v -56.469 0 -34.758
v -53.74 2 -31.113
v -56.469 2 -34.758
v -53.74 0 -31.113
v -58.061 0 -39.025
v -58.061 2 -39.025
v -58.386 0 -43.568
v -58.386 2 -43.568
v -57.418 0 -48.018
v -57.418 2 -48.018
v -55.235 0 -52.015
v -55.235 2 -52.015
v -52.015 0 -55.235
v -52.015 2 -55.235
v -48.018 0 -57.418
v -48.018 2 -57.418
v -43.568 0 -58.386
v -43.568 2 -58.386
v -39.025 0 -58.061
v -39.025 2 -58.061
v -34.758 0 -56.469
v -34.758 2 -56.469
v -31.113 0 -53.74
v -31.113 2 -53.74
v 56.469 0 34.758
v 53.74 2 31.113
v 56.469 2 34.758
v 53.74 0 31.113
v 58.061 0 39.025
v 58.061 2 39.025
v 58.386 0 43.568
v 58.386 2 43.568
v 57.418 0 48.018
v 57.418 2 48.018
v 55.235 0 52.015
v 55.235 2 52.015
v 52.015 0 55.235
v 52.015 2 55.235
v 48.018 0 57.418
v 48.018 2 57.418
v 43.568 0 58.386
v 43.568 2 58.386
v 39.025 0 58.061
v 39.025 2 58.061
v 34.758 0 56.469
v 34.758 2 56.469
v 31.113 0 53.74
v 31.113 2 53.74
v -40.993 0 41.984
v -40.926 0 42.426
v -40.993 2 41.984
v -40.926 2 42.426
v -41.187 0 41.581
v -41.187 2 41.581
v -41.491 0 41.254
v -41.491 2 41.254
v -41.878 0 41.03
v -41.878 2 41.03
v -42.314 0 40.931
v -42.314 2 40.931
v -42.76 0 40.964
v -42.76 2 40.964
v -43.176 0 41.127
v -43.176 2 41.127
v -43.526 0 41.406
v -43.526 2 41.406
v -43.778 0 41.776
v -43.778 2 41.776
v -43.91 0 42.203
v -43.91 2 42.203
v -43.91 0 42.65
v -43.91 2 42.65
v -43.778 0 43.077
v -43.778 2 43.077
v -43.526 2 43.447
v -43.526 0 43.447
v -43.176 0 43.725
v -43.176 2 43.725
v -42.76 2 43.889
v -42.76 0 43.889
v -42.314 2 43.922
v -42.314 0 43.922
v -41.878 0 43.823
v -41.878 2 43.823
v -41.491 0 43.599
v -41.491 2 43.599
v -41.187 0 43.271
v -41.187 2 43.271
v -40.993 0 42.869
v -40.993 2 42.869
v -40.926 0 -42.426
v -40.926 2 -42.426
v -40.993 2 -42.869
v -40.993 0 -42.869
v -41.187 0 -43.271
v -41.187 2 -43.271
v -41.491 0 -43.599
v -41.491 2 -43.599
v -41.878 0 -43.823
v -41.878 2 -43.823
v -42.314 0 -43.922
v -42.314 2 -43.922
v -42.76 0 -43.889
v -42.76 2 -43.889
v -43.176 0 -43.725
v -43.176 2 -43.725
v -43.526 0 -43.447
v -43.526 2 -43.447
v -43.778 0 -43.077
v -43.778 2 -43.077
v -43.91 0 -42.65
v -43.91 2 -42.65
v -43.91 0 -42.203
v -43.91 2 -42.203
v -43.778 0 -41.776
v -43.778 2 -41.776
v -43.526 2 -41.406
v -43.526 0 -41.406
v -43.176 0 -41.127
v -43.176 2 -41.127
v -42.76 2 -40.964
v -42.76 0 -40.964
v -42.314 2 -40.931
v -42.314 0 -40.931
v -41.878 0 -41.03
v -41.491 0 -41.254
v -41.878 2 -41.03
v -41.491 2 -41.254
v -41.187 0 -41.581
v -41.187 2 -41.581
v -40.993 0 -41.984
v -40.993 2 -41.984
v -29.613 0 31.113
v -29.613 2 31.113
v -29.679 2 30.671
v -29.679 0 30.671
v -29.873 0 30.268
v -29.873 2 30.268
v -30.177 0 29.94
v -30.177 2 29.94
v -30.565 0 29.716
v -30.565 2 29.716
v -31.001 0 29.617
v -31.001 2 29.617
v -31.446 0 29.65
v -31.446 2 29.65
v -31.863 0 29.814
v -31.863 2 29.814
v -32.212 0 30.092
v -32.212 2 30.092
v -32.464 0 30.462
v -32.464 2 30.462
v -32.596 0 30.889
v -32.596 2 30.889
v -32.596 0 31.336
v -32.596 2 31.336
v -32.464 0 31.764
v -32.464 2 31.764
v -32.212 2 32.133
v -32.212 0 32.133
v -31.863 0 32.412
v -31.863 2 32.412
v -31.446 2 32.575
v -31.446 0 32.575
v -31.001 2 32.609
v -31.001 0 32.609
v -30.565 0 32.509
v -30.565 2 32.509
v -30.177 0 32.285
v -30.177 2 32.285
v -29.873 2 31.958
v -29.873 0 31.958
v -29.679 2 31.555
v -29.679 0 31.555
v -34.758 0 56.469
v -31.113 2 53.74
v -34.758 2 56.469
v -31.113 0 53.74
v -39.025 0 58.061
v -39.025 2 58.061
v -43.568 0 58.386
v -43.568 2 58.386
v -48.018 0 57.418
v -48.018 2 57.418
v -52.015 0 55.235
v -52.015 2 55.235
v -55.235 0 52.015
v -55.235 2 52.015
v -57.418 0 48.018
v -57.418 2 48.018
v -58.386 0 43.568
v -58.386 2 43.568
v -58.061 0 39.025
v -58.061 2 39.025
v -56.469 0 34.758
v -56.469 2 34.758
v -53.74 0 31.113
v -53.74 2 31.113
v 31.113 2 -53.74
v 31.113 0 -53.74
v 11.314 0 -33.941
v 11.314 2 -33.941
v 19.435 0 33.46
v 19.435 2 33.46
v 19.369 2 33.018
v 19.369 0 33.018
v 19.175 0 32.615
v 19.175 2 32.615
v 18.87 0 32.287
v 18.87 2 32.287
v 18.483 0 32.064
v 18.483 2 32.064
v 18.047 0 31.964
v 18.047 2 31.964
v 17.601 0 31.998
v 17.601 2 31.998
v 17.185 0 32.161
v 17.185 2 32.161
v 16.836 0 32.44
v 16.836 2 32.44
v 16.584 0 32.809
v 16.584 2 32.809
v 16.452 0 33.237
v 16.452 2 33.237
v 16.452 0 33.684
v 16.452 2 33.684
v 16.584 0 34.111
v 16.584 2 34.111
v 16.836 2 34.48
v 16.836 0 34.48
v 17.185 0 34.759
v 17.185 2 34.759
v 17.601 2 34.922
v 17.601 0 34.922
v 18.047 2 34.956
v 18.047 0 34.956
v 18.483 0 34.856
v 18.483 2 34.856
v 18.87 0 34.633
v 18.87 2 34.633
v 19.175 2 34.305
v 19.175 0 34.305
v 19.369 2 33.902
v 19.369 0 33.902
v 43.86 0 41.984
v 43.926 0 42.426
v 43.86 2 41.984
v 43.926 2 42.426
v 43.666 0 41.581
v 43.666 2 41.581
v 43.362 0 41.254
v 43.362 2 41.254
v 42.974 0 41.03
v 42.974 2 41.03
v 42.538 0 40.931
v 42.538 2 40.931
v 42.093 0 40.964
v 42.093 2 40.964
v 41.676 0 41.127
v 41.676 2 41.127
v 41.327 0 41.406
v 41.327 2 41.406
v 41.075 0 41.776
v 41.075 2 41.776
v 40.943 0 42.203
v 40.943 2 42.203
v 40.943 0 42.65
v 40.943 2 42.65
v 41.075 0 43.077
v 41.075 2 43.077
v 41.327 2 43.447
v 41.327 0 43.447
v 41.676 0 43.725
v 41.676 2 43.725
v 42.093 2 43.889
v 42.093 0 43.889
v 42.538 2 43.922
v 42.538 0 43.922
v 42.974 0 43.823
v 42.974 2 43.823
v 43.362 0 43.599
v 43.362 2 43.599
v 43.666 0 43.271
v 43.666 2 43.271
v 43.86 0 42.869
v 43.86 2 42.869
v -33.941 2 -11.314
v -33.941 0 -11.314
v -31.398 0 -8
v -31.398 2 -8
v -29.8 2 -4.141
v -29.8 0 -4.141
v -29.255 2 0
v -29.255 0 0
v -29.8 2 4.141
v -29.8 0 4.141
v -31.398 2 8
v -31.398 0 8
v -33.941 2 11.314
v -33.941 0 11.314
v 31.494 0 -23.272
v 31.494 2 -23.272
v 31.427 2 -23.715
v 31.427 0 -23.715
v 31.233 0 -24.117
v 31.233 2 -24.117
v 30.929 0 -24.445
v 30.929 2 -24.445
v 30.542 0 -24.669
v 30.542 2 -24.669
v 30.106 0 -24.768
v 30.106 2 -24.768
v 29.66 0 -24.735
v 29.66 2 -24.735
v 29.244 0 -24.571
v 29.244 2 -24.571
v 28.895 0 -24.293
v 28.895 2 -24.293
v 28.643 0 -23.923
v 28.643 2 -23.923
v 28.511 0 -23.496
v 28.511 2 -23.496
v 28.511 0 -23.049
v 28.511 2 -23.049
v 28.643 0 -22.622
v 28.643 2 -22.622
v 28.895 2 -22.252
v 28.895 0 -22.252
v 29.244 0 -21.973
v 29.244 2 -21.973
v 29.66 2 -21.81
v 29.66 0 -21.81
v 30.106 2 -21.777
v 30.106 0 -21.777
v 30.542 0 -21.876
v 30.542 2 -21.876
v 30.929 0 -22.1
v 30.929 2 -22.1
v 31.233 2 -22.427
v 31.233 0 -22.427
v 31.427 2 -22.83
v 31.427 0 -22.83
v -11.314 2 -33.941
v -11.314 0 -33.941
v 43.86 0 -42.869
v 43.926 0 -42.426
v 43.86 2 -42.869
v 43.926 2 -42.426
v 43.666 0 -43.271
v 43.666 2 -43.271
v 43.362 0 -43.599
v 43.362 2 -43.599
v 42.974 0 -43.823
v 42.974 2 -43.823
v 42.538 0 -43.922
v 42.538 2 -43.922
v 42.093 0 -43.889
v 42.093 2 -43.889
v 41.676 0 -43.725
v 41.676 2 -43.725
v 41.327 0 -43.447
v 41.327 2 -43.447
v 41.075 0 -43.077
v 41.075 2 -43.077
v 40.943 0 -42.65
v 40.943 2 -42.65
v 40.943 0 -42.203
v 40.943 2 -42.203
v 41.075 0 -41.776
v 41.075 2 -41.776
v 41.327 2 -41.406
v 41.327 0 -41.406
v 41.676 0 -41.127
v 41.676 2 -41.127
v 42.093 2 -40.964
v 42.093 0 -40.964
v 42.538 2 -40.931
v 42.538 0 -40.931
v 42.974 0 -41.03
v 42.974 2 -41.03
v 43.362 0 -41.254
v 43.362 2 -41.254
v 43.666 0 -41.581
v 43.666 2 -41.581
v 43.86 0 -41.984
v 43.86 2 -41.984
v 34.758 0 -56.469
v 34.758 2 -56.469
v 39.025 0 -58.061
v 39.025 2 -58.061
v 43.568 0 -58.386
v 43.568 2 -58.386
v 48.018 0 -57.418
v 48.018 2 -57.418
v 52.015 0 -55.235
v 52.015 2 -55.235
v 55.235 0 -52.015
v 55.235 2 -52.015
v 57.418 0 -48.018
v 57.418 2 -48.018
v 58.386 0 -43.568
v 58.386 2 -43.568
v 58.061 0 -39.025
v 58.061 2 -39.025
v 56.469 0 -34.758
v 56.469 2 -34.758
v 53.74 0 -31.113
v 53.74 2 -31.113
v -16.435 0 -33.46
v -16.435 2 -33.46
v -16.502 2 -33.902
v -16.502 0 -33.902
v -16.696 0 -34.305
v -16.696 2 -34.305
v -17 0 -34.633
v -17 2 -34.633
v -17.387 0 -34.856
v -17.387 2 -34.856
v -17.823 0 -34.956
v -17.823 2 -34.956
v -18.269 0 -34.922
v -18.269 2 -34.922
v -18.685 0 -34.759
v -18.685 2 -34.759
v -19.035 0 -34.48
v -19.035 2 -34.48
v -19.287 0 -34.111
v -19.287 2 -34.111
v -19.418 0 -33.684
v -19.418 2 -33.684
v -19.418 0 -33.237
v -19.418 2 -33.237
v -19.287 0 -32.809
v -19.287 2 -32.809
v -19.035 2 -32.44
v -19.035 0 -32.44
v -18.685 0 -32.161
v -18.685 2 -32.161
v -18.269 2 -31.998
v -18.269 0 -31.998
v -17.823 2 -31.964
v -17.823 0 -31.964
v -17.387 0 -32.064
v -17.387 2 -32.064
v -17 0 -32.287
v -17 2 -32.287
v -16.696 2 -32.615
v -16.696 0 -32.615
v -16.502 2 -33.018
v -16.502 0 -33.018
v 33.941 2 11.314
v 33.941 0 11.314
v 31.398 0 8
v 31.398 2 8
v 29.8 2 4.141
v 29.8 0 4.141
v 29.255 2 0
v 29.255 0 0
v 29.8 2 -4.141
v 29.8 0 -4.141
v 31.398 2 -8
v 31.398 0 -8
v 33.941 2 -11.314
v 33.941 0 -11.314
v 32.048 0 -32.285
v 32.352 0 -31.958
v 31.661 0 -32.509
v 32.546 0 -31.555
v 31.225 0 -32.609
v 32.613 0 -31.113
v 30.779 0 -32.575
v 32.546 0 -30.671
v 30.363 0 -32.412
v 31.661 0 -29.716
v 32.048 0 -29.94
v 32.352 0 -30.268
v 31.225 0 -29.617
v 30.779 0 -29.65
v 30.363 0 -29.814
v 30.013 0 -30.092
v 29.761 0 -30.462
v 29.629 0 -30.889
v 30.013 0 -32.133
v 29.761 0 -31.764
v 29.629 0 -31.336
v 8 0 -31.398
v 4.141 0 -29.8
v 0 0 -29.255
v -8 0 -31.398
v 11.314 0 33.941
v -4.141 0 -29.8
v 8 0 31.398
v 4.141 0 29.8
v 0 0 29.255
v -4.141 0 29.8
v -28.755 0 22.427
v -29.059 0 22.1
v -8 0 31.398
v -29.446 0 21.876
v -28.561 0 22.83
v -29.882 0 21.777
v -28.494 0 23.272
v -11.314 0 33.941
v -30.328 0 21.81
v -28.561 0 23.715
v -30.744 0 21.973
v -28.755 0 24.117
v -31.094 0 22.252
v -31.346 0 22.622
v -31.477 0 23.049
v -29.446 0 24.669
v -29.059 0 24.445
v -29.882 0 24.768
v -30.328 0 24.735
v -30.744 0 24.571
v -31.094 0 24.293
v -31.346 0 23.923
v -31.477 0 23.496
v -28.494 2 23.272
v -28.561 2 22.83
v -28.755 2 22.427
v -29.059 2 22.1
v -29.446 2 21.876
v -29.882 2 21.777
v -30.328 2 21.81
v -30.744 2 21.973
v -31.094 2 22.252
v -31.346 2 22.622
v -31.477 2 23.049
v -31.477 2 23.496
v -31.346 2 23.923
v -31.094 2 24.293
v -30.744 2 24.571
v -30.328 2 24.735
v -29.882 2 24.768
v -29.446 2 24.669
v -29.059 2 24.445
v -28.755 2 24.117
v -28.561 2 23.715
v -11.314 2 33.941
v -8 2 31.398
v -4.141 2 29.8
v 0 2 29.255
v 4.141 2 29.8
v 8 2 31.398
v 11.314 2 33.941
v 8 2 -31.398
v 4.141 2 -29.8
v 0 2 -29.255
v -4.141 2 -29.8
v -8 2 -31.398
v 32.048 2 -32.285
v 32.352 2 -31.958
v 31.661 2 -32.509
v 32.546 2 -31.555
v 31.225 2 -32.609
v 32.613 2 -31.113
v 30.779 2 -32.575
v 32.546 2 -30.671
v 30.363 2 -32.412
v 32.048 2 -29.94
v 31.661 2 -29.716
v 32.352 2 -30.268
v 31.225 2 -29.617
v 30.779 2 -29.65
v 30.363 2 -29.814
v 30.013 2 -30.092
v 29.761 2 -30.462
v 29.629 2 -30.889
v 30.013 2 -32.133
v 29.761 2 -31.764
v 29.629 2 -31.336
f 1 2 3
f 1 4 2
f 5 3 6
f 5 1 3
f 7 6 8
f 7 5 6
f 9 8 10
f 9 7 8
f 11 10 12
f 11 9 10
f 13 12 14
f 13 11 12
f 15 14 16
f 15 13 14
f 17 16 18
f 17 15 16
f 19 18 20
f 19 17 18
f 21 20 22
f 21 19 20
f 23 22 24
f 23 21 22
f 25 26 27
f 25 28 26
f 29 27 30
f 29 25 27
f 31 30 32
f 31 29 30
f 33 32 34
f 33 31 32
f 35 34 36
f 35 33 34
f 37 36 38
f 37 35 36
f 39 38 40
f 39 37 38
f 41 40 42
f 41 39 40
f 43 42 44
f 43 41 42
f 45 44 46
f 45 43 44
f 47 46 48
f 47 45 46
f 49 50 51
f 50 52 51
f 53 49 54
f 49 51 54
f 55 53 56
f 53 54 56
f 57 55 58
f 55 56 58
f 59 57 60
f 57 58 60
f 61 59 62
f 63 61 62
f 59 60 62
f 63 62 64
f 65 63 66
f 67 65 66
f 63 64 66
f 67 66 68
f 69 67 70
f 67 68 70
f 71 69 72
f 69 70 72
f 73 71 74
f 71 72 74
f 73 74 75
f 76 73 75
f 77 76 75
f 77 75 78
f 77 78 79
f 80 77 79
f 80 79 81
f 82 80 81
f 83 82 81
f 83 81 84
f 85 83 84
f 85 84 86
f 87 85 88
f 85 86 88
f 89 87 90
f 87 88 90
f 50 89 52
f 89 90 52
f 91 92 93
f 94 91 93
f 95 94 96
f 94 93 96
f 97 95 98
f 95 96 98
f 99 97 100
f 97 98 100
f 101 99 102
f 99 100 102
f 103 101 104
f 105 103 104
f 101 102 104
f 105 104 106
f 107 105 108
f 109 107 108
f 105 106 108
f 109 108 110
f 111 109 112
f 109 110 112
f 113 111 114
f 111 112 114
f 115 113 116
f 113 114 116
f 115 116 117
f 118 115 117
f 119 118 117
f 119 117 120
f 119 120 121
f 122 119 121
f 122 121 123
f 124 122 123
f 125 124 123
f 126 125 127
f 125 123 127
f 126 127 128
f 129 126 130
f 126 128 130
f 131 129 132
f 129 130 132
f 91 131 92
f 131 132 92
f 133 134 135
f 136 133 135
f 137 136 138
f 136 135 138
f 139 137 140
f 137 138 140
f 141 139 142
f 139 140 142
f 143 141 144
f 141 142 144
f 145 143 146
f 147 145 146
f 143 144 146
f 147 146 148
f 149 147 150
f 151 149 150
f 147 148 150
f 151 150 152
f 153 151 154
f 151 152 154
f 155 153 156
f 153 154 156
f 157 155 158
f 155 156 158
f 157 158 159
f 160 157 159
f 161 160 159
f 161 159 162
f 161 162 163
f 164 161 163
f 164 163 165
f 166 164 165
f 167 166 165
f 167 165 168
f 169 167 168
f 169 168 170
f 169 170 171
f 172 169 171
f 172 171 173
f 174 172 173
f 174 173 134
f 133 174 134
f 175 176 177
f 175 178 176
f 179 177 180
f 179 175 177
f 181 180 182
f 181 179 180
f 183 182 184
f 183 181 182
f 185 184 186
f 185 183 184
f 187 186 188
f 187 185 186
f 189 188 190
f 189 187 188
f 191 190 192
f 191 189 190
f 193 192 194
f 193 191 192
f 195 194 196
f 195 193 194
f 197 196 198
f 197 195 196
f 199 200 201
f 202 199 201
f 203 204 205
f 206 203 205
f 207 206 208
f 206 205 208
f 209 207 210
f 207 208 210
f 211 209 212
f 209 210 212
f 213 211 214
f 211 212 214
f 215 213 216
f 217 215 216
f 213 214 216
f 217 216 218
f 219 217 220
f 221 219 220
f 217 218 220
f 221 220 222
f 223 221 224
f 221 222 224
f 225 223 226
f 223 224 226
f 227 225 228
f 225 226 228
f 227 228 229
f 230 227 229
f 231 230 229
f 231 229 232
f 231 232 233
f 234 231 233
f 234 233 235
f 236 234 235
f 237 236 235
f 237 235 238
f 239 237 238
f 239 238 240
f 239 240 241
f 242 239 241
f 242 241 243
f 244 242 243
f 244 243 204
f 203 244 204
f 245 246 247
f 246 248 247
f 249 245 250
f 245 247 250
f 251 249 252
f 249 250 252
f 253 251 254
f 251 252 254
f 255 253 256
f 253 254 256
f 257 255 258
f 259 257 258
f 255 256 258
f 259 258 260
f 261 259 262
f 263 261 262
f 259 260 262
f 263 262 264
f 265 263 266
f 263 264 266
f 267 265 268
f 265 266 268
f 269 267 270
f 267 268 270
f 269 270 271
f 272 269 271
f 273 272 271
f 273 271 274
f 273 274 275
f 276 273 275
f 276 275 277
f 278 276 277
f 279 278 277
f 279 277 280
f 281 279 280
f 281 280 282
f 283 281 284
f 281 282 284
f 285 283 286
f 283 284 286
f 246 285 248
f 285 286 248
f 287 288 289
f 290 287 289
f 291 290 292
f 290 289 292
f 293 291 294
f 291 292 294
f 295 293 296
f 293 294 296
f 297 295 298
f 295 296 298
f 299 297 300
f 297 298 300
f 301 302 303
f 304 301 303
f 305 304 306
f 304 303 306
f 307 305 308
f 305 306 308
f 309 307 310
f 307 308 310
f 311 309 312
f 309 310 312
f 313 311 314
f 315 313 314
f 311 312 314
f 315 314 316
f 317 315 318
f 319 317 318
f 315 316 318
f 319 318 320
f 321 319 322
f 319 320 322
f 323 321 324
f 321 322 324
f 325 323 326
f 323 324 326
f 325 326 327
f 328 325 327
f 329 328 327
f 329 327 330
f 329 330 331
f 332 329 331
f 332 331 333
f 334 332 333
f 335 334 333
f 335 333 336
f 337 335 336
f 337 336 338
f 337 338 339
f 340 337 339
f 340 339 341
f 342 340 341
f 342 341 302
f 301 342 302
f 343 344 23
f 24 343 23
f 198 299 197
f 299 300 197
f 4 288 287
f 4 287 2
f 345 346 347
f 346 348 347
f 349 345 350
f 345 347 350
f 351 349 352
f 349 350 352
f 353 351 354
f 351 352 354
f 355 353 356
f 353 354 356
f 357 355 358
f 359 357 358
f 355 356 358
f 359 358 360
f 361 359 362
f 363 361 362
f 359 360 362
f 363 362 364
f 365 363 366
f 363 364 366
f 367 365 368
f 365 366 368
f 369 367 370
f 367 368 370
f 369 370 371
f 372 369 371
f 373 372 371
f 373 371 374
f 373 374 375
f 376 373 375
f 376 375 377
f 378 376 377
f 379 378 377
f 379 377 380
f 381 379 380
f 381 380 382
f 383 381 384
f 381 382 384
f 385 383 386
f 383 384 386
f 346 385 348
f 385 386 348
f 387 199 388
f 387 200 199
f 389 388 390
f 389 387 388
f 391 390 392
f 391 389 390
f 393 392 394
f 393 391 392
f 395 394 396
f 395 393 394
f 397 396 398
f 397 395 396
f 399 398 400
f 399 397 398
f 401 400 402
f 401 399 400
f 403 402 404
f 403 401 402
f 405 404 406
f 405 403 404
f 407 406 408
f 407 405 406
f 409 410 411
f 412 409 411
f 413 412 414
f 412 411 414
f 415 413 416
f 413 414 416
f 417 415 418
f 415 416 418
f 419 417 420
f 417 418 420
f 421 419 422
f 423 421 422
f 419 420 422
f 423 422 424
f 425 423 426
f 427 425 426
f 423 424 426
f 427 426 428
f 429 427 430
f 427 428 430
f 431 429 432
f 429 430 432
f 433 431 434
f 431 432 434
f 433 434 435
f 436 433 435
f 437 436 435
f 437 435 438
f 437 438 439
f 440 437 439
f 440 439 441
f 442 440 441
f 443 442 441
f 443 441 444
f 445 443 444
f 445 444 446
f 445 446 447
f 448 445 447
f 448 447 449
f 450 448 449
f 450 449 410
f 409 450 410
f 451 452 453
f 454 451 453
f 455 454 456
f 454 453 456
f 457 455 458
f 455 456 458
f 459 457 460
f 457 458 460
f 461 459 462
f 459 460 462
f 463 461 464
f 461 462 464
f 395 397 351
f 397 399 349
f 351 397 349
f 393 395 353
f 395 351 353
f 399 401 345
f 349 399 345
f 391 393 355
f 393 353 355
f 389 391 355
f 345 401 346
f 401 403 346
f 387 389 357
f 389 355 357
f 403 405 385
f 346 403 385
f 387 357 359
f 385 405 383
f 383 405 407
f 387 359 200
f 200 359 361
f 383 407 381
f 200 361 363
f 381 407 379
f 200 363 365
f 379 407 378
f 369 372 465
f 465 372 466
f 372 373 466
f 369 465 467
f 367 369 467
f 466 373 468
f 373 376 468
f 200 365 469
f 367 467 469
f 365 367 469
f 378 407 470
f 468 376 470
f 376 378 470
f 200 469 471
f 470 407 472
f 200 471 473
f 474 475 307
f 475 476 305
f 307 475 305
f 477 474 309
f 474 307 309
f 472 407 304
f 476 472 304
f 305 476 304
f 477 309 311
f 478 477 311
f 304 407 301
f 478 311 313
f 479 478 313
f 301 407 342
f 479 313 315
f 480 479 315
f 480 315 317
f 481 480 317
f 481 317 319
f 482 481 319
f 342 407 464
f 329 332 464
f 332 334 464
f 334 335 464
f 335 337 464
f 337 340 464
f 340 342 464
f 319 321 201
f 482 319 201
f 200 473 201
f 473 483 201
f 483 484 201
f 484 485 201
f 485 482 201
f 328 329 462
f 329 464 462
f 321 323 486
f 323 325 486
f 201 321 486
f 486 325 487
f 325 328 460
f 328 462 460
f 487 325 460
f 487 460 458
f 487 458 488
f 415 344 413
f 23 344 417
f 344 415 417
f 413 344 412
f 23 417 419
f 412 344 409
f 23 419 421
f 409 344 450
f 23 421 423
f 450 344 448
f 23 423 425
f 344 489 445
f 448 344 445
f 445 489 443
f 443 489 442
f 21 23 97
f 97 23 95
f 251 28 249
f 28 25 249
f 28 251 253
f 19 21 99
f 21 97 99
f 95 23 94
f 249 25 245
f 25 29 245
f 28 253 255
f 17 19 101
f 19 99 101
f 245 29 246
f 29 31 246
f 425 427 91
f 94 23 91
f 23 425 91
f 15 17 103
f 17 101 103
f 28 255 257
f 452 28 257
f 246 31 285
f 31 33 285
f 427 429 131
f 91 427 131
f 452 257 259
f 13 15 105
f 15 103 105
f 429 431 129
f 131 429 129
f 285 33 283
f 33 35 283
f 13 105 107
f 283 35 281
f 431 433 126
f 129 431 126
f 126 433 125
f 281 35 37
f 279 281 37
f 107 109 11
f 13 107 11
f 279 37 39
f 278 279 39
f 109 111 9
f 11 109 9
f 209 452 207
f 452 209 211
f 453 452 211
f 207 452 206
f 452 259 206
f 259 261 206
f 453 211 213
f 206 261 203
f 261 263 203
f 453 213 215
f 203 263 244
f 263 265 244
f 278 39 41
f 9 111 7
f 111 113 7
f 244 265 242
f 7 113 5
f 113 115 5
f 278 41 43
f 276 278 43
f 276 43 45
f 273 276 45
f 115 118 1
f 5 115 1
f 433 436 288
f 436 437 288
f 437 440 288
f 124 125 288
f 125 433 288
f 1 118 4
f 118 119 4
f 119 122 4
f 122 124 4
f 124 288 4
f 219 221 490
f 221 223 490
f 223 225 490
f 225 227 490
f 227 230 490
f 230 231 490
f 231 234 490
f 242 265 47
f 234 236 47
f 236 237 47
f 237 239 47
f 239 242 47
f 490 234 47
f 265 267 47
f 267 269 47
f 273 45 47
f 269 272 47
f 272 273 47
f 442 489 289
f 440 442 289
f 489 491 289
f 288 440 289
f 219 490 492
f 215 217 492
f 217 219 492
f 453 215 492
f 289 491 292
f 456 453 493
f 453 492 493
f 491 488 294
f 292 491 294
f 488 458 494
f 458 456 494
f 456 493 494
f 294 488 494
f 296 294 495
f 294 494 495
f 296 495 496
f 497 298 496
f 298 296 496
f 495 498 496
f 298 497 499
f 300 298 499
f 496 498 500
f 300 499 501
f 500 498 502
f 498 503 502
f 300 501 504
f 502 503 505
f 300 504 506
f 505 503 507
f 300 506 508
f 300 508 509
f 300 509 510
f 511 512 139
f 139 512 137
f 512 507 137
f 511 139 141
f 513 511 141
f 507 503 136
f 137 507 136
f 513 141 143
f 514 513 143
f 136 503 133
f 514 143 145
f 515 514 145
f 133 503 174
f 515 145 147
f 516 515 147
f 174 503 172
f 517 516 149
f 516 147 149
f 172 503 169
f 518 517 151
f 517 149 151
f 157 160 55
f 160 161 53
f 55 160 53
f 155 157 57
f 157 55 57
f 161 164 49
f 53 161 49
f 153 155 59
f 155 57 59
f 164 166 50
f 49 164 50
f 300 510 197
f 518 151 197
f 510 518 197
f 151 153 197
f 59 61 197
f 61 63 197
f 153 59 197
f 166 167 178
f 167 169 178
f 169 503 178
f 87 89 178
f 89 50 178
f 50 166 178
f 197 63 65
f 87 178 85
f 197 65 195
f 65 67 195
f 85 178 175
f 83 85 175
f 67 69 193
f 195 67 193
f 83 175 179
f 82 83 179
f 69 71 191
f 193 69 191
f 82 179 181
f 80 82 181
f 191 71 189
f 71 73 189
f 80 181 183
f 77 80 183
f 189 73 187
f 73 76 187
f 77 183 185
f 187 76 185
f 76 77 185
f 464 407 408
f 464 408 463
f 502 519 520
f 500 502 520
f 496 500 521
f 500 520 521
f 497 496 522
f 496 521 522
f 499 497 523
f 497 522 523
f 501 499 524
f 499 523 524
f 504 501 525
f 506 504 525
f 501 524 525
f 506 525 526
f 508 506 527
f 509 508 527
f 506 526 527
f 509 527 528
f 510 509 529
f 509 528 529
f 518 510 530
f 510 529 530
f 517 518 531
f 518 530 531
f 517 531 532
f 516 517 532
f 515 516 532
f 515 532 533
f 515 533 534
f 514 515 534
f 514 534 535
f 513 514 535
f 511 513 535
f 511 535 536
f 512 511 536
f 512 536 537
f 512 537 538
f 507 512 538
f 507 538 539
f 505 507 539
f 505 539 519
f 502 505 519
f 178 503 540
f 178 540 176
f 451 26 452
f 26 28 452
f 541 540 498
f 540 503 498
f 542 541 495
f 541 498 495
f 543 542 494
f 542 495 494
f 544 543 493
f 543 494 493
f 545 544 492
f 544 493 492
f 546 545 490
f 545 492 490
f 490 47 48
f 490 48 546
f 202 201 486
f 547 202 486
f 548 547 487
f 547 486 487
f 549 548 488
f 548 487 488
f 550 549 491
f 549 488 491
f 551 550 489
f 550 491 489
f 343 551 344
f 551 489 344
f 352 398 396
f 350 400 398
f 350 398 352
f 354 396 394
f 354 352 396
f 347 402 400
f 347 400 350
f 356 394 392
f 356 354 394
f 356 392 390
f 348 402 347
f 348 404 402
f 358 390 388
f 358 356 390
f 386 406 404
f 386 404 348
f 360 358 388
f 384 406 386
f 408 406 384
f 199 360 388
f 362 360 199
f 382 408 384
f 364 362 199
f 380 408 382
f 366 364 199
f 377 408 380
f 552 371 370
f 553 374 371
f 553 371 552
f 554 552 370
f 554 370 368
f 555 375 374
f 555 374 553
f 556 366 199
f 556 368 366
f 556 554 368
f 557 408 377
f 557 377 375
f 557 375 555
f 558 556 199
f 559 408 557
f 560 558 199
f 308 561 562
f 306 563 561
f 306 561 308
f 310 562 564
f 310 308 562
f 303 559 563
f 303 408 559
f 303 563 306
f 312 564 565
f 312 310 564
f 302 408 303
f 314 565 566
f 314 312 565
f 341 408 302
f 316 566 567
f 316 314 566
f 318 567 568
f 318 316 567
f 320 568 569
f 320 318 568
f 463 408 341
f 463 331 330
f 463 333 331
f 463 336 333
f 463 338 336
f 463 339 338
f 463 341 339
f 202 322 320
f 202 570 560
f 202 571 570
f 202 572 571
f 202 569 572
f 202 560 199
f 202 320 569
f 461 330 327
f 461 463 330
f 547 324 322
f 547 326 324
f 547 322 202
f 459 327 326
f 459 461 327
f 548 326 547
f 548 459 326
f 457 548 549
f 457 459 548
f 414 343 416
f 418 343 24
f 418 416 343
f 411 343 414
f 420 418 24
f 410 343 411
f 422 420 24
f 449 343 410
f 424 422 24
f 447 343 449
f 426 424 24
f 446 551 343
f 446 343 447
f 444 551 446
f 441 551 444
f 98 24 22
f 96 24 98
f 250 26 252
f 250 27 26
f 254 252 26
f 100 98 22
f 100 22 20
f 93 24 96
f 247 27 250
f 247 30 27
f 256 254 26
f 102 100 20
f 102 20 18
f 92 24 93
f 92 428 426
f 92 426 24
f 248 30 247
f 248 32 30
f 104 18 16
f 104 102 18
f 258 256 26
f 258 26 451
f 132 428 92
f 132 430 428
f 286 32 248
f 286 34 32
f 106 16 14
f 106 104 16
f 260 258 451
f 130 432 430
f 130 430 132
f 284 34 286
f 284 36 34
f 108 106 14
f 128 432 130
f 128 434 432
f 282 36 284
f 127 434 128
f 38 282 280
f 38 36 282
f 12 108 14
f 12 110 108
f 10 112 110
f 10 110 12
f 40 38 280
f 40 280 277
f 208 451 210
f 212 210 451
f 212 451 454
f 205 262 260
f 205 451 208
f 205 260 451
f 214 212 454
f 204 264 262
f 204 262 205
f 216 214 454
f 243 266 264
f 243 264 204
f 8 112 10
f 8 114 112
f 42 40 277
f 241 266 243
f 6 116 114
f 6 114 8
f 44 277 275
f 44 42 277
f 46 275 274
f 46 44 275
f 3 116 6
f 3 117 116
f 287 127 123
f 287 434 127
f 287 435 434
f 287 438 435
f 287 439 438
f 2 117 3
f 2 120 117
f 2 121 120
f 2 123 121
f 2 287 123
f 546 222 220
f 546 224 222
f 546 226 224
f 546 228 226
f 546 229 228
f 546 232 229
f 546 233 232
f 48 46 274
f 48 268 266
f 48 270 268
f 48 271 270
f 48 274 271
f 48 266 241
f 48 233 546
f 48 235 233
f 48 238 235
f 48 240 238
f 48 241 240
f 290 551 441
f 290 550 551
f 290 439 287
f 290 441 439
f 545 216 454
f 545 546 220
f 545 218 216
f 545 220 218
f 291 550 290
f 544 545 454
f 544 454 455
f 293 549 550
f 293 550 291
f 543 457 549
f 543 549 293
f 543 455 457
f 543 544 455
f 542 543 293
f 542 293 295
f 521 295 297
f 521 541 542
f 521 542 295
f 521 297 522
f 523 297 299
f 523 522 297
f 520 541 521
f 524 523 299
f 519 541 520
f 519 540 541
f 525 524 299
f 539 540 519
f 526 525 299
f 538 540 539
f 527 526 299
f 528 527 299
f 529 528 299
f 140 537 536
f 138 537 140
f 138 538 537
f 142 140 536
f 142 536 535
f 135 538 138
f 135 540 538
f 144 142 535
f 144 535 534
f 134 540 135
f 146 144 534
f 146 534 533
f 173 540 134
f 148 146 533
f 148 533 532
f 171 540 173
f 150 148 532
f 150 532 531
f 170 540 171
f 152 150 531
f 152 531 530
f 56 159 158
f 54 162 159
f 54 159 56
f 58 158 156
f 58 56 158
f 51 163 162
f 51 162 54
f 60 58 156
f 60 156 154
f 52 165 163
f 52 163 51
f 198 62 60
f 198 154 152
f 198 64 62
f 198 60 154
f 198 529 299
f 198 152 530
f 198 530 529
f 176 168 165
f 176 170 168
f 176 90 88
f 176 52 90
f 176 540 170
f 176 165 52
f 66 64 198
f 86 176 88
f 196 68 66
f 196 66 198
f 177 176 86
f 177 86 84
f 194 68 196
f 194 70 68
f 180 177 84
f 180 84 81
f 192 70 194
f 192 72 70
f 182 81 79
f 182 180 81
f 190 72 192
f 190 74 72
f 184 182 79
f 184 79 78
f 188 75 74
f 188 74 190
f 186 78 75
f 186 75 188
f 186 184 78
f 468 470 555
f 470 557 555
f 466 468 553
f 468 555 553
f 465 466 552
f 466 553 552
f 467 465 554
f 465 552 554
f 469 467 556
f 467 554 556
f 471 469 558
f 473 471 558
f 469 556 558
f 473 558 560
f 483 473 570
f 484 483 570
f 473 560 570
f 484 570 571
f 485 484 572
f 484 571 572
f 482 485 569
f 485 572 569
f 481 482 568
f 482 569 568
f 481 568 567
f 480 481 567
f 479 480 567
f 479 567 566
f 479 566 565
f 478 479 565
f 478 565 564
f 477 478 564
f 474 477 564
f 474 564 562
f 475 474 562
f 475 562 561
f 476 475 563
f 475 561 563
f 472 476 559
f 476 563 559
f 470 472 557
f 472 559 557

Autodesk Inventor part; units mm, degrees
ref_plane "YZ Plane" through (0, 0, 0) normal (1, 0, 0) x (0, 1, 0)
ref_plane "XZ Plane" through (0, 0, 0) normal (0, 1, 0) x (-1, 0, 0)
ref_plane "XY Plane" through (0, 0, 0) normal (0, 0, 1) x (1, 0, 0)
sketch "Sketch1" plane through (0, 0, 0) normal (0, 1, 0) x (-1, 0, 0)
  arc A0 (-53.7401, -31.1127) -> (-31.1127, -53.7401) centre (-42.4264, -42.4264) ccw
  arc A1 (31.1127, -53.7401) -> (53.7401, -31.1127) centre (42.4264, -42.4264) ccw
  arc A2 (53.7401, 31.1127) -> (31.1127, 53.7401) centre (42.4264, 42.4264) ccw
  arc A3 (-31.1127, 53.7401) -> (-53.7401, 31.1127) centre (-42.4264, 42.4264) ccw
  line L0 (-53.7401, 31.1127) -> (-33.9411, 11.3137)
  line L1 (11.3137, -33.9411) -> (31.1127, -53.7401)
  line L2 (-53.7401, -31.1127) -> (-33.9411, -11.3137)
  line L3 (11.3137, 33.9411) -> (31.1127, 53.7401)
  line L4 (-31.1127, 53.7401) -> (-11.3137, 33.9411)
  line L5 (33.9411, -11.3137) -> (53.7401, -31.1127)
  line L6 (-31.1127, -53.7401) -> (-11.3137, -33.9411)
  line L7 (33.9411, 11.3137) -> (53.7401, 31.1127)
  arc A4 (11.3137, -33.9411) -> (-11.3137, -33.9411) centre (0, -45.2548) ccw
  arc A5 (33.9411, 11.3137) -> (33.9411, -11.3137) centre (45.2548, 0) ccw
  arc A6 (-11.3137, 33.9411) -> (11.3137, 33.9411) centre (0, 45.2548) ccw
  arc A7 (-33.9411, -11.3137) -> (-33.9411, 11.3137) centre (-45.2548, 0) ccw
  arc A8 (-53.7401, -31.1127) -> (-31.1127, -53.7401) centre (-42.4264, -42.4264) ccw
  arc A9 (31.1127, -53.7401) -> (53.7401, -31.1127) centre (42.4264, -42.4264) ccw
  arc A10 (53.7401, 31.1127) -> (31.1127, 53.7401) centre (42.4264, 42.4264) ccw
  arc A11 (-31.1127, 53.7401) -> (-53.7401, 31.1127) centre (-42.4264, 42.4264) ccw
  line L8 (-53.7401, 31.1127) -> (-33.9411, 11.3137)
  line L9 (11.3137, -33.9411) -> (31.1127, -53.7401)
  line L10 (-53.7401, -31.1127) -> (-33.9411, -11.3137)
  line L11 (11.3137, 33.9411) -> (31.1127, 53.7401)
  line L12 (-31.1127, 53.7401) -> (-11.3137, 33.9411)
  line L13 (33.9411, -11.3137) -> (53.7401, -31.1127)
  line L14 (-31.1127, -53.7401) -> (-11.3137, -33.9411)
  line L15 (33.9411, 11.3137) -> (53.7401, 31.1127)
  arc A12 (11.3137, -33.9411) -> (-11.3137, -33.9411) centre (0, -45.2548) ccw
  arc A13 (33.9411, 11.3137) -> (33.9411, -11.3137) centre (45.2548, 0) ccw
  arc A14 (-11.3137, 33.9411) -> (11.3137, 33.9411) centre (0, 45.2548) ccw
  arc A15 (-33.9411, -11.3137) -> (-33.9411, 11.3137) centre (-45.2548, 0) ccw
  arc A16 (-53.7401, -31.1127) -> (-31.1127, -53.7401) centre (-42.4264, -42.4264) ccw
  arc A17 (31.1127, -53.7401) -> (53.7401, -31.1127) centre (42.4264, -42.4264) ccw
  arc A18 (53.7401, 31.1127) -> (31.1127, 53.7401) centre (42.4264, 42.4264) ccw
  arc A19 (-31.1127, 53.7401) -> (-53.7401, 31.1127) centre (-42.4264, 42.4264) ccw
  line L16 (-53.7401, 31.1127) -> (-33.9411, 11.3137)
  line L17 (11.3137, -33.9411) -> (31.1127, -53.7401)
  line L18 (-53.7401, -31.1127) -> (-33.9411, -11.3137)
  line L19 (11.3137, 33.9411) -> (31.1127, 53.7401)
  line L20 (-31.1127, 53.7401) -> (-11.3137, 33.9411)
  line L21 (33.9411, -11.3137) -> (53.7401, -31.1127)
  line L22 (-31.1127, -53.7401) -> (-11.3137, -33.9411)
  line L23 (33.9411, 11.3137) -> (53.7401, 31.1127)
  arc A20 (11.3137, -33.9411) -> (-11.3137, -33.9411) centre (0, -45.2548) ccw
  arc A21 (33.9411, 11.3137) -> (33.9411, -11.3137) centre (45.2548, 0) ccw
  arc A22 (-11.3137, 33.9411) -> (11.3137, 33.9411) centre (0, 45.2548) ccw
  arc A23 (-33.9411, -11.3137) -> (-33.9411, 11.3137) centre (-45.2548, 0) ccw
  point P0 (0, 0)
  point P1 (0, 0)
  point P2 (0, 0)
  point P3 (0, 0)
  point P4 (0, 0)
  point P5 (0, 0)
  point P6 (0, 0)
extrude "Extrusion1" add sketch "Sketch1" along normal blind 2
sketch "Sketch3" plane through (0, 2, 0) normal (0, 1, 0) x (1, 0, 0)
  arc A0 (53.7401, 31.1127) -> (31.1127, 53.7401) centre (42.4264, 42.4264) ccw projected
  circle A1 centre (42.4264, 42.4264) radius 1.5
  arc A2 (-31.1127, 53.7401) -> (-53.7401, 31.1127) centre (-42.4264, 42.4264) ccw projected
  circle A3 centre (-42.4264, 42.4264) radius 1.5
  arc A4 (-53.7401, -31.1127) -> (-31.1127, -53.7401) centre (-42.4264, -42.4264) ccw projected
  circle A5 centre (-42.4264, -42.4264) radius 1.5
  arc A6 (31.1127, -53.7401) -> (53.7401, -31.1127) centre (42.4264, -42.4264) ccw projected
  circle A7 centre (42.4264, -42.4264) radius 1.5
  circle A8 centre (-31.1127, -31.1127) radius 1.5
  circle A9 centre (31.1127, 31.1127) radius 1.5
  circle A10 centre (-29.9941, -23.2724) radius 1.5
  circle A11 centre (-17.9352, 33.4601) radius 1.5
  circle A12 centre (29.9941, 23.2724) radius 1.5
  circle A13 centre (17.9352, -33.4601) radius 1.5
  point P0 (0, 0)
  dimension "d5" = 3
  dimension "d6" = 3
  dimension "d7" = 3
  dimension "d8" = 3
  dimension "d43" = 3
  dimension "d44" = 3
  dimension "d47" = 3
  dimension "d48" = 3
  dimension "d49" = 3
  dimension "d50" = 3
extrude "Extrusion3" cut sketch "Sketch3" against normal blind 20
properties part number "platform 1"
